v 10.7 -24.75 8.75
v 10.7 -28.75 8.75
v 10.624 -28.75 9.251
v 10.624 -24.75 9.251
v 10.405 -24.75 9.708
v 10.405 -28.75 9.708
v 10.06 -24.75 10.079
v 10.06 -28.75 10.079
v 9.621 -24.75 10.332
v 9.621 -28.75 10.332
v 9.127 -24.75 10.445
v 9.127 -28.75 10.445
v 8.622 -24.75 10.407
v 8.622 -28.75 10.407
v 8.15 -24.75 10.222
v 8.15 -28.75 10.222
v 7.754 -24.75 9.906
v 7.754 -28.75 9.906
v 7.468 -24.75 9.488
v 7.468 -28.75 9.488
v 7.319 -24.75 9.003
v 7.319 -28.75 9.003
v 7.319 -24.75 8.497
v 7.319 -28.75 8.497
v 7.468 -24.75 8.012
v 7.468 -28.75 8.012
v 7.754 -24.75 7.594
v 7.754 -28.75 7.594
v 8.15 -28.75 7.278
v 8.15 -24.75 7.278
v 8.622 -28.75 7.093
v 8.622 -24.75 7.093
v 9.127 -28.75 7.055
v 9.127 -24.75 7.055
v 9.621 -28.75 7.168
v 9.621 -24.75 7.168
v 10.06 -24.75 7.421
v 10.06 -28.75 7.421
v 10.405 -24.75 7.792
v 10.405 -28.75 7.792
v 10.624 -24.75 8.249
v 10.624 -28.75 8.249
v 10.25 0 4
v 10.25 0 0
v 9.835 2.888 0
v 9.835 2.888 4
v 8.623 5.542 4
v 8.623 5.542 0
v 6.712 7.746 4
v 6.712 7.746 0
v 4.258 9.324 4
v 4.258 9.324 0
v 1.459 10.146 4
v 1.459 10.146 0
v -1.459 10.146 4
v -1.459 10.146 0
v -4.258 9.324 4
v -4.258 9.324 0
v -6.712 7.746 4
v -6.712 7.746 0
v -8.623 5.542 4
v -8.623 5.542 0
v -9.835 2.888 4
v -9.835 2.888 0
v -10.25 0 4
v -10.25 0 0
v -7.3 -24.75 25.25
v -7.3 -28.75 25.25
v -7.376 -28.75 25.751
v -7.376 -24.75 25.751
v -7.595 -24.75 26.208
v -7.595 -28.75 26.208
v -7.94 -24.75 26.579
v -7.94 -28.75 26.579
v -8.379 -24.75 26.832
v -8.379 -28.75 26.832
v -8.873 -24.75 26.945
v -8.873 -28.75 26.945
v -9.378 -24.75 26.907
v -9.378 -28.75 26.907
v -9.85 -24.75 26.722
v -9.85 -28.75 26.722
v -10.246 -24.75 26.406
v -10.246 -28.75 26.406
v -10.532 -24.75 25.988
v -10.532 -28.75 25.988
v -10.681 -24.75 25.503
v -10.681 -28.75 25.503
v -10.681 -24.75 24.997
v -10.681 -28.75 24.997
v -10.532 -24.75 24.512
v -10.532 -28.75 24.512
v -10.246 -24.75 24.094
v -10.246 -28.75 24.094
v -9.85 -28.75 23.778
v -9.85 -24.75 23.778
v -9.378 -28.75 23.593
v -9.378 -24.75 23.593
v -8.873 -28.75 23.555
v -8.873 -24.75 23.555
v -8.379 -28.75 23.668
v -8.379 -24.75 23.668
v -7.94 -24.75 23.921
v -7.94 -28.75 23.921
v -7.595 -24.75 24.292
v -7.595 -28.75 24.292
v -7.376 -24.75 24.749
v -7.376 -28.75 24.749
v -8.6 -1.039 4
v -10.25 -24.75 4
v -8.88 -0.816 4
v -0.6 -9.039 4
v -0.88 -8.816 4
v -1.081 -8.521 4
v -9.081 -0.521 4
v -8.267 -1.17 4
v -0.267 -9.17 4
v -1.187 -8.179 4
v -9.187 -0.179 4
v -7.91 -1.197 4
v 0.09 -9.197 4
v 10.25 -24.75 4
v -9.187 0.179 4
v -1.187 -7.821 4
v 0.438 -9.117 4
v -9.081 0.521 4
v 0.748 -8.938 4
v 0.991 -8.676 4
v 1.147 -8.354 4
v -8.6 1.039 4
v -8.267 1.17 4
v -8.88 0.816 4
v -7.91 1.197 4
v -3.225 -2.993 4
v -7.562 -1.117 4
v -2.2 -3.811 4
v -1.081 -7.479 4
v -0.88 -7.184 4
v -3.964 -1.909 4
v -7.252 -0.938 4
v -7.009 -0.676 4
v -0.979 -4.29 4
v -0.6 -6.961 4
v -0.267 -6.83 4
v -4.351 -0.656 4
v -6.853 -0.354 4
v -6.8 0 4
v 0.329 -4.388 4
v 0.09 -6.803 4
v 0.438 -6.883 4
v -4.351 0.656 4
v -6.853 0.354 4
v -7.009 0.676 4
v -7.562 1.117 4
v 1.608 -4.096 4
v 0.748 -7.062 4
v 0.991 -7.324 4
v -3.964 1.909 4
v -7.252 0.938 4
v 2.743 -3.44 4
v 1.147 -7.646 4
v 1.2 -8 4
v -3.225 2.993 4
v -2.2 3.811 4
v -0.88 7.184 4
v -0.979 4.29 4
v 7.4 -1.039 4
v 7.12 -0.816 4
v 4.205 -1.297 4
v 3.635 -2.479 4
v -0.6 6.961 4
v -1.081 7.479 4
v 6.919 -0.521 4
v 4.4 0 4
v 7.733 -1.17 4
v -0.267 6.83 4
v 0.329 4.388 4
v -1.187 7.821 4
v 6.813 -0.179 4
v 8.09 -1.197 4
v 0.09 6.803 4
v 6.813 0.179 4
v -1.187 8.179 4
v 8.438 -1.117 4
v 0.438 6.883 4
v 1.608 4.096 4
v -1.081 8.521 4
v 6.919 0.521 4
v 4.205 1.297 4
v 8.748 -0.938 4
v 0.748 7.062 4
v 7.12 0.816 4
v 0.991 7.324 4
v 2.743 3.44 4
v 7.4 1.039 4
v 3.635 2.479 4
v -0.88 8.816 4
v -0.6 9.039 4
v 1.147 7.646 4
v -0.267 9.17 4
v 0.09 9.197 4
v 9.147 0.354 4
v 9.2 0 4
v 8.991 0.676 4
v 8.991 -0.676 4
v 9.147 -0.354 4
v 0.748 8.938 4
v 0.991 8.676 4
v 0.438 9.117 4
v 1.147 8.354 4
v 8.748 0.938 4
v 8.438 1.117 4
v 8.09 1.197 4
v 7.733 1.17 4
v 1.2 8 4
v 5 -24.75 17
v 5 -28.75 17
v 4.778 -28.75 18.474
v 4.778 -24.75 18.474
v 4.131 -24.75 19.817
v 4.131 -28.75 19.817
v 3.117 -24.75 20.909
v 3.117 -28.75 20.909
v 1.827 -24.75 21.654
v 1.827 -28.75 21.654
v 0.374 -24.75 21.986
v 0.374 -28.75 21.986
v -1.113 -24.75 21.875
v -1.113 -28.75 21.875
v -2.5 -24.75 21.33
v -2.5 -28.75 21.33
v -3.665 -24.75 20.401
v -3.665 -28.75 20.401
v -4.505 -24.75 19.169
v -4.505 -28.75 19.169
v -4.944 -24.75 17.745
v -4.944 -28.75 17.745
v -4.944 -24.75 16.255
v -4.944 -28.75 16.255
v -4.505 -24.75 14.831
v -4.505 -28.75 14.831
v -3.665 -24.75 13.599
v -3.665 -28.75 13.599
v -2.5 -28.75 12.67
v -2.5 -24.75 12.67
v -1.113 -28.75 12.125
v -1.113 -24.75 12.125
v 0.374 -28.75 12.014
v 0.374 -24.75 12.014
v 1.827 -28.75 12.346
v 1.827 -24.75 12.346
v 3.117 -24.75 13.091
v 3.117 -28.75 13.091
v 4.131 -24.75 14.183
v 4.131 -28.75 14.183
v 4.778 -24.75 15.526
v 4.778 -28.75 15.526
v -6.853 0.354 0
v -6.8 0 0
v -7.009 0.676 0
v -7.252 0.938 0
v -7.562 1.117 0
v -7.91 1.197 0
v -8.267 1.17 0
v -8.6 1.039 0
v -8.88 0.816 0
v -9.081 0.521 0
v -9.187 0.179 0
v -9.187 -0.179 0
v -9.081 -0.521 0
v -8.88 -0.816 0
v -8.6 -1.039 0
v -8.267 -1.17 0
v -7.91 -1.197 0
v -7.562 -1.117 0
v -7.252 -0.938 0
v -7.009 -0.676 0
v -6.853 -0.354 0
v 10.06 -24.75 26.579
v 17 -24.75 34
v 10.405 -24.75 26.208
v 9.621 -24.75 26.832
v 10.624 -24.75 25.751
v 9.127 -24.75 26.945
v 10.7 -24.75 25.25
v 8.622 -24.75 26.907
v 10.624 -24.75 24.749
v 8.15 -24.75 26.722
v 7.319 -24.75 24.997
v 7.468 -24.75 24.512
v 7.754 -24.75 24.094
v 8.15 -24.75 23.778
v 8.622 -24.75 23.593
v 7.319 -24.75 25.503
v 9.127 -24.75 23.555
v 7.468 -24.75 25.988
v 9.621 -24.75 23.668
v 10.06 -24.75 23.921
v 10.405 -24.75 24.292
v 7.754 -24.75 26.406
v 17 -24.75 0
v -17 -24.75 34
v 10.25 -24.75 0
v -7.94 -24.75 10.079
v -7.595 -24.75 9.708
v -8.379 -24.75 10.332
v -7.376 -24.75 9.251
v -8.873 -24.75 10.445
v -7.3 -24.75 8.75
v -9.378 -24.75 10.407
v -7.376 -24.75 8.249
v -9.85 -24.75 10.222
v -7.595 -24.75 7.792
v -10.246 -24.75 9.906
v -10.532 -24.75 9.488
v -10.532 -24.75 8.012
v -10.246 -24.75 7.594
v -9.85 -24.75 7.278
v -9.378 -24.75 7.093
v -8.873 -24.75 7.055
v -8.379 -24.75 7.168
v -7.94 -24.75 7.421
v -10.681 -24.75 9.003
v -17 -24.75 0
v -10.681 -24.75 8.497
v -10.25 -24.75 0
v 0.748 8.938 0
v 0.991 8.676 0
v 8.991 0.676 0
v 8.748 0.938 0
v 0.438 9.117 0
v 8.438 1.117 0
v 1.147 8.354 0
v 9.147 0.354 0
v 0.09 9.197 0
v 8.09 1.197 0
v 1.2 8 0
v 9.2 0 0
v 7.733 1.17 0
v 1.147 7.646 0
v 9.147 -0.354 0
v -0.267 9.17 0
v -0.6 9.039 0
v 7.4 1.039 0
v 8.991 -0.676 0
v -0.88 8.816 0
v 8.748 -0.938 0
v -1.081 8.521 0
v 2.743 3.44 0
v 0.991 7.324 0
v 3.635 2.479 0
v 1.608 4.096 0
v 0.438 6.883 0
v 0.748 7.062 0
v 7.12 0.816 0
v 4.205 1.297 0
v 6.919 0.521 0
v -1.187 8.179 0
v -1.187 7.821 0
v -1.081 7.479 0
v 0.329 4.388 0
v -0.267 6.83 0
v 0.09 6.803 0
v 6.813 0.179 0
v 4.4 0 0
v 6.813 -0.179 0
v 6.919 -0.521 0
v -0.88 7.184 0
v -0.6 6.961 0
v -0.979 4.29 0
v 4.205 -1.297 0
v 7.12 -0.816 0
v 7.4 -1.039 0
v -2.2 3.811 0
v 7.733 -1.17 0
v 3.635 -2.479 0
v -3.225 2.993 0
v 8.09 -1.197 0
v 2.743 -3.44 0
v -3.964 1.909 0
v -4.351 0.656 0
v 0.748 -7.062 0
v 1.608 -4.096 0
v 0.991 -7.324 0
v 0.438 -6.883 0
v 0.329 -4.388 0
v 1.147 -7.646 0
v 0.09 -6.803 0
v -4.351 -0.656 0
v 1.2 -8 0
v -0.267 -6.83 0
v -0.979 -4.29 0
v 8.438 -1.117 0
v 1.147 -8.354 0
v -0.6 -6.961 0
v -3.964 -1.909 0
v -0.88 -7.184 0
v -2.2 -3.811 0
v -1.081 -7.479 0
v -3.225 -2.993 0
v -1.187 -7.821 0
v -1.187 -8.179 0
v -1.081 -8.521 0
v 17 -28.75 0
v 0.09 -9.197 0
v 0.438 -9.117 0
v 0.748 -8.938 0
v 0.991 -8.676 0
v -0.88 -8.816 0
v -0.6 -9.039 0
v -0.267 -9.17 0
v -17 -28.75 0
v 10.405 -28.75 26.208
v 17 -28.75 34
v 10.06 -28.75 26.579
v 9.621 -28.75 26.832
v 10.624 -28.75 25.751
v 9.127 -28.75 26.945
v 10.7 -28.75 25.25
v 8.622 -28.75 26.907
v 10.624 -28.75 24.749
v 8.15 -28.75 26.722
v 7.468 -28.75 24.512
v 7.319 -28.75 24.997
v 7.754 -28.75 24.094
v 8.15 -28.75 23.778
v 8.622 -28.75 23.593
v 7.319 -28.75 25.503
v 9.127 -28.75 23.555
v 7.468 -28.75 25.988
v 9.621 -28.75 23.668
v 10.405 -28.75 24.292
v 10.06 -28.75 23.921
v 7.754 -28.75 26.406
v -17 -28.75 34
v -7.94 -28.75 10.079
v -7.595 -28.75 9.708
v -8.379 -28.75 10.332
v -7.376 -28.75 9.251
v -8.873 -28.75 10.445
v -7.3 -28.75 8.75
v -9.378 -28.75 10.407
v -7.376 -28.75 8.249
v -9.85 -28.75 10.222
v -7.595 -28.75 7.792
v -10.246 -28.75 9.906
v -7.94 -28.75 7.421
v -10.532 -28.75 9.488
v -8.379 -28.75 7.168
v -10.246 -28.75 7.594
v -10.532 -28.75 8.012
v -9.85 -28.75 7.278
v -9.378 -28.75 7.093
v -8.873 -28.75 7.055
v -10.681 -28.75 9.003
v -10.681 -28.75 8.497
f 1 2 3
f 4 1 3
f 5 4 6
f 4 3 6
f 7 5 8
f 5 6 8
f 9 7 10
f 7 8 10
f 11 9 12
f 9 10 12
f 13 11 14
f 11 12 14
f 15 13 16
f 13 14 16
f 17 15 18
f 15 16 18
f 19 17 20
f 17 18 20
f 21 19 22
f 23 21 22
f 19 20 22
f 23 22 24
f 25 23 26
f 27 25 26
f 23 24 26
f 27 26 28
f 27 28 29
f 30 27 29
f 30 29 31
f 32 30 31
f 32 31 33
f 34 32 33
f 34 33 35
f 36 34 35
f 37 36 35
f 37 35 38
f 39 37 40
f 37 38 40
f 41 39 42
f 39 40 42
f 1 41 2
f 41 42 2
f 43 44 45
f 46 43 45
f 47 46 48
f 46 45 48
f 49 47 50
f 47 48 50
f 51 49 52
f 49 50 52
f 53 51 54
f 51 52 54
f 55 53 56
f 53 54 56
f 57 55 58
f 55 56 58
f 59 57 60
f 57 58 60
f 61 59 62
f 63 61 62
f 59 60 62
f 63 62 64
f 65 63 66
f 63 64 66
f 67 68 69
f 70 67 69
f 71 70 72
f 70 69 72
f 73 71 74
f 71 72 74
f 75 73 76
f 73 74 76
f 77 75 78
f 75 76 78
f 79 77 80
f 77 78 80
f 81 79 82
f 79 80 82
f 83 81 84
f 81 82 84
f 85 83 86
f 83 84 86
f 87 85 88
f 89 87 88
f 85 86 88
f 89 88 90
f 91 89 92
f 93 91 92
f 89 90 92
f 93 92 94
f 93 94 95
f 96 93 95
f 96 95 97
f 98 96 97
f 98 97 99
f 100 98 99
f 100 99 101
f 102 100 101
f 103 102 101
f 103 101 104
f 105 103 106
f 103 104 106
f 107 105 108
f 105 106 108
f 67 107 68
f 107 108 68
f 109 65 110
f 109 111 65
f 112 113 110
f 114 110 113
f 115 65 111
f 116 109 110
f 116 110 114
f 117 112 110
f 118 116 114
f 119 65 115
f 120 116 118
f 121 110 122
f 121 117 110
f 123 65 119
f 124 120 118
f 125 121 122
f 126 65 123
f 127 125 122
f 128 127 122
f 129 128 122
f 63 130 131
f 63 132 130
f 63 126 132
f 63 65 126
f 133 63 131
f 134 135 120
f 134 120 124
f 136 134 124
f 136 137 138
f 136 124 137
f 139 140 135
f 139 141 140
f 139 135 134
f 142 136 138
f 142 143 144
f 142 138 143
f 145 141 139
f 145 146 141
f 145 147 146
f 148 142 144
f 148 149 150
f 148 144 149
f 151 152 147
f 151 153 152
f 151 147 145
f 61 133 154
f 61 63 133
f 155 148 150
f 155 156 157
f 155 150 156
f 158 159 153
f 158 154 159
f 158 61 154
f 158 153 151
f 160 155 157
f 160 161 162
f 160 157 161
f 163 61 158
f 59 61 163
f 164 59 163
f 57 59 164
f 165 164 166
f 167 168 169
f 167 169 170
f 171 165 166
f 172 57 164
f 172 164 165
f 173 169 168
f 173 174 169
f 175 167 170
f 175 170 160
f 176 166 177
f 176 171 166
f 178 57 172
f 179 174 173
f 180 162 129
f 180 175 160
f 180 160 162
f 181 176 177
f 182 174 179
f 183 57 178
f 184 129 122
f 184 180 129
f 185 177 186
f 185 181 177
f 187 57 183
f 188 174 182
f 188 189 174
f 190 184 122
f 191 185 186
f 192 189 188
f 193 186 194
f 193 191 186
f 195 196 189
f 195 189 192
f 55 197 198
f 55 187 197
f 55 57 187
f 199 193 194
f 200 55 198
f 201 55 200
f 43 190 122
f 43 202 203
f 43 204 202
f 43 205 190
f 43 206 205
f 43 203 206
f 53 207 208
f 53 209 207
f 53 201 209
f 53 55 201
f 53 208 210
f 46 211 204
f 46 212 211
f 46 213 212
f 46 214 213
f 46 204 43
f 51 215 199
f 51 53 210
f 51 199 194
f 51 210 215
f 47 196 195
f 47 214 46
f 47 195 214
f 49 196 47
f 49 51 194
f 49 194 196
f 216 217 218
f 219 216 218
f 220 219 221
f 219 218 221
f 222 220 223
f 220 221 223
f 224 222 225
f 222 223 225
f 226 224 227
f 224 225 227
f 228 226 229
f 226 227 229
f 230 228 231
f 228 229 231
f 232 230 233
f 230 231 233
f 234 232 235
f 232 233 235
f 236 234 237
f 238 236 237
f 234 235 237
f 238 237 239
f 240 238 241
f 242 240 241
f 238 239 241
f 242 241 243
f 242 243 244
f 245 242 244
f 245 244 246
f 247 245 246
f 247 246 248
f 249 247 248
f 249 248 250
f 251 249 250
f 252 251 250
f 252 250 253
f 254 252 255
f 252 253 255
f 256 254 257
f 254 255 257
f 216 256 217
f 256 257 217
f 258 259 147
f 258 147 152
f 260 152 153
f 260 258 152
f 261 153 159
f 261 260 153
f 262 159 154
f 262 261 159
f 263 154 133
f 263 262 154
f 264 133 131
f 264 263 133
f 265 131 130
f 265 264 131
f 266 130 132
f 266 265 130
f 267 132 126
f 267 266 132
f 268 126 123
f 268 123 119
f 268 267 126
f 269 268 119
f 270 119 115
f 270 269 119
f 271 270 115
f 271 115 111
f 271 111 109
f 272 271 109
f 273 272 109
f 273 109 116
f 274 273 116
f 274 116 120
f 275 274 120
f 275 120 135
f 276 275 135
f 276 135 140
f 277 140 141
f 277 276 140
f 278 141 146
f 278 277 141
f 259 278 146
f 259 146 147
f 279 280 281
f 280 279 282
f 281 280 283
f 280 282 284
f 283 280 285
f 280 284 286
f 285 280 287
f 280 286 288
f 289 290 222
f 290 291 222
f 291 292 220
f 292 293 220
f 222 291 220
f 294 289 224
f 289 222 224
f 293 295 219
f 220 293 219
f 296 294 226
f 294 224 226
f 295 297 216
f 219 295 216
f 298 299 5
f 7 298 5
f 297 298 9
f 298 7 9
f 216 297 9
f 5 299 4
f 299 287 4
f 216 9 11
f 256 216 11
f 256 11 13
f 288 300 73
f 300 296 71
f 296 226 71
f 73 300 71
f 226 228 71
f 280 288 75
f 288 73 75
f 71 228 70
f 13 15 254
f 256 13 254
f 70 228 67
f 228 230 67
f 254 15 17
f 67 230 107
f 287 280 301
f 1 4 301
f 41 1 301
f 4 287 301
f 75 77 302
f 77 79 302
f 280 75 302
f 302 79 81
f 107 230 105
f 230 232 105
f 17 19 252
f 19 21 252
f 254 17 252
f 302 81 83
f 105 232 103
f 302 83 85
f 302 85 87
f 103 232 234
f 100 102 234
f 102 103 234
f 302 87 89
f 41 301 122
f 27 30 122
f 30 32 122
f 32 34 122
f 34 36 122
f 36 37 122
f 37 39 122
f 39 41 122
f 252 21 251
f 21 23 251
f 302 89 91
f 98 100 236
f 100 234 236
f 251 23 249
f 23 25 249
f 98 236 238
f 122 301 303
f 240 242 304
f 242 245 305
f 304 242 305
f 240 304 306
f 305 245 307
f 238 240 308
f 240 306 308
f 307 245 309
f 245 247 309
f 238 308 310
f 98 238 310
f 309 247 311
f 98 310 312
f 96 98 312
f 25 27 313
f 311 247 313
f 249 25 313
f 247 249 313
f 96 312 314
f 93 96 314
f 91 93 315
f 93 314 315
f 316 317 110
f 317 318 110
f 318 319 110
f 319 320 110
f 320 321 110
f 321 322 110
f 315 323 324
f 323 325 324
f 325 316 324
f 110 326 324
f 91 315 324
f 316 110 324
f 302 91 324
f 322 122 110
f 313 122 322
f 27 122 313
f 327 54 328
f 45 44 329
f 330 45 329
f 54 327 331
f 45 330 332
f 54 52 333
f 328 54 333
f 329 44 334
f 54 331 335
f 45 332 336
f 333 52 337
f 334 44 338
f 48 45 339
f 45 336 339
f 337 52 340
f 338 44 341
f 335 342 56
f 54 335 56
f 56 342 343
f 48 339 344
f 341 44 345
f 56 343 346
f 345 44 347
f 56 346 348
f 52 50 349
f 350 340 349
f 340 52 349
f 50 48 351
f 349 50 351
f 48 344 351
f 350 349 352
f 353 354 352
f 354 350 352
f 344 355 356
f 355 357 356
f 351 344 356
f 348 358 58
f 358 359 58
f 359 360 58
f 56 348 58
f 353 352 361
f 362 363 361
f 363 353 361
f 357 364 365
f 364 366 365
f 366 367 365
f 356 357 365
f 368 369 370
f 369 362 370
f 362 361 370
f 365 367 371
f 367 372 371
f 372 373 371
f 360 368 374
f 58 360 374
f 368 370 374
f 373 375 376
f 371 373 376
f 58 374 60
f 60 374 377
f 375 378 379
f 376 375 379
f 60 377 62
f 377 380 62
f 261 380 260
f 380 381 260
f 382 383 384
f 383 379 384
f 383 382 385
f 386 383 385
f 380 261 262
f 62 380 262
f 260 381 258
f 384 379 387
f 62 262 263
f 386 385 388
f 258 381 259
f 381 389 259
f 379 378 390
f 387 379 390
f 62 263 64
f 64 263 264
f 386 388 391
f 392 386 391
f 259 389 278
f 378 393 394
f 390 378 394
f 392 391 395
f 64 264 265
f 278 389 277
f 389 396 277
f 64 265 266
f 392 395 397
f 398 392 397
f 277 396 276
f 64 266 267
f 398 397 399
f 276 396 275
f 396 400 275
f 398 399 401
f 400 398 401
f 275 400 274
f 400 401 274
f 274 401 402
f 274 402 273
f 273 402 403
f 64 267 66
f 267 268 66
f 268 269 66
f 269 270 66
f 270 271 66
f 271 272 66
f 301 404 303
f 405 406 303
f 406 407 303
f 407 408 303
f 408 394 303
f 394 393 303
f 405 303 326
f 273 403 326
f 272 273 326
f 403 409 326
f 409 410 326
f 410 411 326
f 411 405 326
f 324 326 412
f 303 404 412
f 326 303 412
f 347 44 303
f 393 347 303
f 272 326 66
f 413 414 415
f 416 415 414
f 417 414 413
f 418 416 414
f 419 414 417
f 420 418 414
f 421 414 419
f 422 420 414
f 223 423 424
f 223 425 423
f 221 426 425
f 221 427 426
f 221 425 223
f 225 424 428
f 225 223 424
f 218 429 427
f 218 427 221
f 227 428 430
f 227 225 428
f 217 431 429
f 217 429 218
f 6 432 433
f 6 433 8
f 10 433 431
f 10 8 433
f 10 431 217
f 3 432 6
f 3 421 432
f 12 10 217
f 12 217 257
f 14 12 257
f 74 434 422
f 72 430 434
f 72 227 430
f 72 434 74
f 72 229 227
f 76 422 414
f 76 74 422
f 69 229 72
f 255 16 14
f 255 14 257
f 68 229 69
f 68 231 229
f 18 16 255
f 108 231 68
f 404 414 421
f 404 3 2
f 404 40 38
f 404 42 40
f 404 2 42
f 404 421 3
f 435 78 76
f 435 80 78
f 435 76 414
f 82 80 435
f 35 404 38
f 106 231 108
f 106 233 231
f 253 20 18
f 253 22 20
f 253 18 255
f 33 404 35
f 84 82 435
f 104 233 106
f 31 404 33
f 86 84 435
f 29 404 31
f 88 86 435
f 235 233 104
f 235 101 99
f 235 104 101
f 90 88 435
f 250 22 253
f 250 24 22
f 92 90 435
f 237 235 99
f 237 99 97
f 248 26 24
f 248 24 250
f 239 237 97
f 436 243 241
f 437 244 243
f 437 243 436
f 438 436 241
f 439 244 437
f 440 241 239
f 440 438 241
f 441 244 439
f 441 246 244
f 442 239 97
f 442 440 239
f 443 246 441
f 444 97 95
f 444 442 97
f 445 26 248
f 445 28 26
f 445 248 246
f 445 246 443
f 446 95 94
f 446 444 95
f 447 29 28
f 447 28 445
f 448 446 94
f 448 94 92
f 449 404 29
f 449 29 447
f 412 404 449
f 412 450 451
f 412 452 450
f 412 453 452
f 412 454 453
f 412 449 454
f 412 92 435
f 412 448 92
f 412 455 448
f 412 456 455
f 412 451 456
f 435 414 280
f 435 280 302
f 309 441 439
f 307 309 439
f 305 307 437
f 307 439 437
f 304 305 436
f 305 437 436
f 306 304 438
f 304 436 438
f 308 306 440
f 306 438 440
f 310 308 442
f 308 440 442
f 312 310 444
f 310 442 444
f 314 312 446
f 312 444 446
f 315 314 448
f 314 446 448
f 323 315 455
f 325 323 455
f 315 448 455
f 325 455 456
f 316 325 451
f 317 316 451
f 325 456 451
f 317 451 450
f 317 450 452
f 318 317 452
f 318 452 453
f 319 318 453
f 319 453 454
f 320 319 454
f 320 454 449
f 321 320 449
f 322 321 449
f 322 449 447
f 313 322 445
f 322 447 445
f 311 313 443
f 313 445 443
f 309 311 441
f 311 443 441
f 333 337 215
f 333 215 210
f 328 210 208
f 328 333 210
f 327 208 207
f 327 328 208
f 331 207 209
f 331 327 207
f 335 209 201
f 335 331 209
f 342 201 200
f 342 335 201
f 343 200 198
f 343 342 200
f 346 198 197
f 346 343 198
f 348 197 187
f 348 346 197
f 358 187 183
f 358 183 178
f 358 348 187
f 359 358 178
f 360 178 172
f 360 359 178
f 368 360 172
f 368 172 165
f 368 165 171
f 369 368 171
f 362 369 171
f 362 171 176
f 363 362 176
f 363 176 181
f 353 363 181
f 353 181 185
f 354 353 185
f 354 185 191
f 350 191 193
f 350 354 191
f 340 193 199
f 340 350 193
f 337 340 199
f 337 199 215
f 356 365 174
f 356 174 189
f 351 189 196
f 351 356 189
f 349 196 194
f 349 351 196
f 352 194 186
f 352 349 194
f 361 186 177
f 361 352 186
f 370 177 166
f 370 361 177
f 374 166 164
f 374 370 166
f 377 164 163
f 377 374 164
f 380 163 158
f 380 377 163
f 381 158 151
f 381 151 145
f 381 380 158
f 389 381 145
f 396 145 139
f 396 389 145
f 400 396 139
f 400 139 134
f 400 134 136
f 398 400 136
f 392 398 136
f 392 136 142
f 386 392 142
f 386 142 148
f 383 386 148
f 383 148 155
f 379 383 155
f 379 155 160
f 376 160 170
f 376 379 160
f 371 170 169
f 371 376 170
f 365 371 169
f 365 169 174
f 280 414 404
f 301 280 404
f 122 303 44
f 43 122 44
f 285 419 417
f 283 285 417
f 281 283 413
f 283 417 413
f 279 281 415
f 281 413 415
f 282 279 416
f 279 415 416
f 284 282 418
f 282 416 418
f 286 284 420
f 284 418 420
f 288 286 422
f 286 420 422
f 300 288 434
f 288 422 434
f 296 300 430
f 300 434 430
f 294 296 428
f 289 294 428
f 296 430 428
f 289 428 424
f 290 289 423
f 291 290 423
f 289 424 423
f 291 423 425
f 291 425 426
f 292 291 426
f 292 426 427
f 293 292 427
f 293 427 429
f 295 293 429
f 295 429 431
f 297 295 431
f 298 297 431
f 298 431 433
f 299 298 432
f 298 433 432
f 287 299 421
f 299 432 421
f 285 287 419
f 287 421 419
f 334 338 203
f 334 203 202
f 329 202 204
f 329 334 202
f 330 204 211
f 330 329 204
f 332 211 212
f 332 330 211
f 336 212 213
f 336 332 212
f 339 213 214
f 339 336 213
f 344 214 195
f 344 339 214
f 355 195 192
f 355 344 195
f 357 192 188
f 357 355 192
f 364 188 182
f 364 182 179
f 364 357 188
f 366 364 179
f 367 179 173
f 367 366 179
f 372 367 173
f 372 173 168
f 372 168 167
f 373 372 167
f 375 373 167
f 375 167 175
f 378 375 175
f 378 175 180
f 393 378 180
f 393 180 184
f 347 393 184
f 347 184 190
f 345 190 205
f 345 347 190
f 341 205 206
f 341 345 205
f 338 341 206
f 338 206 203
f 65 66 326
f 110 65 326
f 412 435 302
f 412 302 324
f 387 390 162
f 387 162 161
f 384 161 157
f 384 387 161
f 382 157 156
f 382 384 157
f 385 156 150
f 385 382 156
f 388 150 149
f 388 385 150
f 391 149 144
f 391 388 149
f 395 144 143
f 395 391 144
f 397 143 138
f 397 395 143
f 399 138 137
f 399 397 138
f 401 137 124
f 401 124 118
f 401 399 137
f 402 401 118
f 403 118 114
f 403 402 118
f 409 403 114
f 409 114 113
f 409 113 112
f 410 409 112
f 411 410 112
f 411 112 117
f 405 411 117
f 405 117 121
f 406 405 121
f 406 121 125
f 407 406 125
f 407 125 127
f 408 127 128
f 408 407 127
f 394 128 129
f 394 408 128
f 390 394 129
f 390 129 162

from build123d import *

# Parameters (mm, degrees)
SKETCH1_R           = 1.2
SKETCH1_R_2         = 4.4
BOSS_EXTRUDE1_DEPTH = 4
SKETCH3_W           = 34
SKETCH3_H           = 34
SKETCH3_R           = 5
SKETCH3_R_2         = 1.7
BOSS_EXTRUDE3_DEPTH = 4


with BuildPart() as part:
    # Sketch1 → Boss-Extrude1 (new body)
    with BuildSketch(Plane.XY):
        with BuildLine():
            Line((-10.25, -28.75), (10.25, -28.75))
            Line((10.25, -28.75), (10.25, 0))
            ThreePointArc((10.25, 0), (0, 10.25), (-10.25, 0))
            Line((-10.25, 0), (-10.25, -28.75))
        make_face()
        with Locations((0, 8)):
            Circle(SKETCH1_R, mode=Mode.SUBTRACT)
        with Locations((-8, 0)):
            Circle(SKETCH1_R, mode=Mode.SUBTRACT)
        with Locations((0, -8)):
            Circle(SKETCH1_R, mode=Mode.SUBTRACT)
        with Locations((8, 0)):
            Circle(SKETCH1_R, mode=Mode.SUBTRACT)
        Circle(SKETCH1_R_2, mode=Mode.SUBTRACT)
    extrude(amount=BOSS_EXTRUDE1_DEPTH)

    # Sketch3 → Boss-Extrude3 (add)
    with BuildSketch(Plane(origin=(0, -28.75, 0), x_dir=(-1, 0, 0), z_dir=(0, -1, 0))):
        with Locations((0, -17)):
            Rectangle(SKETCH3_W, SKETCH3_H)
        with Locations(Location((0, -17, 0), (0, 0, 180))):
            Circle(SKETCH3_R, mode=Mode.SUBTRACT)
        with Locations(Location((-9, -8.75, 0), (0, 0, 180))):
            Circle(SKETCH3_R_2, mode=Mode.SUBTRACT)
        with Locations(Location((9, -8.75, 0), (0, 0, 180))):
            Circle(SKETCH3_R_2, mode=Mode.SUBTRACT)
        with Locations(Location((9, -25.25, 0), (0, 0, 180))):
            Circle(SKETCH3_R_2, mode=Mode.SUBTRACT)
        with Locations(Location((-9, -25.25, 0), (0, 0, 180))):
            Circle(SKETCH3_R_2, mode=Mode.SUBTRACT)
    extrude(amount=-BOSS_EXTRUDE3_DEPTH)


solid = part.part
